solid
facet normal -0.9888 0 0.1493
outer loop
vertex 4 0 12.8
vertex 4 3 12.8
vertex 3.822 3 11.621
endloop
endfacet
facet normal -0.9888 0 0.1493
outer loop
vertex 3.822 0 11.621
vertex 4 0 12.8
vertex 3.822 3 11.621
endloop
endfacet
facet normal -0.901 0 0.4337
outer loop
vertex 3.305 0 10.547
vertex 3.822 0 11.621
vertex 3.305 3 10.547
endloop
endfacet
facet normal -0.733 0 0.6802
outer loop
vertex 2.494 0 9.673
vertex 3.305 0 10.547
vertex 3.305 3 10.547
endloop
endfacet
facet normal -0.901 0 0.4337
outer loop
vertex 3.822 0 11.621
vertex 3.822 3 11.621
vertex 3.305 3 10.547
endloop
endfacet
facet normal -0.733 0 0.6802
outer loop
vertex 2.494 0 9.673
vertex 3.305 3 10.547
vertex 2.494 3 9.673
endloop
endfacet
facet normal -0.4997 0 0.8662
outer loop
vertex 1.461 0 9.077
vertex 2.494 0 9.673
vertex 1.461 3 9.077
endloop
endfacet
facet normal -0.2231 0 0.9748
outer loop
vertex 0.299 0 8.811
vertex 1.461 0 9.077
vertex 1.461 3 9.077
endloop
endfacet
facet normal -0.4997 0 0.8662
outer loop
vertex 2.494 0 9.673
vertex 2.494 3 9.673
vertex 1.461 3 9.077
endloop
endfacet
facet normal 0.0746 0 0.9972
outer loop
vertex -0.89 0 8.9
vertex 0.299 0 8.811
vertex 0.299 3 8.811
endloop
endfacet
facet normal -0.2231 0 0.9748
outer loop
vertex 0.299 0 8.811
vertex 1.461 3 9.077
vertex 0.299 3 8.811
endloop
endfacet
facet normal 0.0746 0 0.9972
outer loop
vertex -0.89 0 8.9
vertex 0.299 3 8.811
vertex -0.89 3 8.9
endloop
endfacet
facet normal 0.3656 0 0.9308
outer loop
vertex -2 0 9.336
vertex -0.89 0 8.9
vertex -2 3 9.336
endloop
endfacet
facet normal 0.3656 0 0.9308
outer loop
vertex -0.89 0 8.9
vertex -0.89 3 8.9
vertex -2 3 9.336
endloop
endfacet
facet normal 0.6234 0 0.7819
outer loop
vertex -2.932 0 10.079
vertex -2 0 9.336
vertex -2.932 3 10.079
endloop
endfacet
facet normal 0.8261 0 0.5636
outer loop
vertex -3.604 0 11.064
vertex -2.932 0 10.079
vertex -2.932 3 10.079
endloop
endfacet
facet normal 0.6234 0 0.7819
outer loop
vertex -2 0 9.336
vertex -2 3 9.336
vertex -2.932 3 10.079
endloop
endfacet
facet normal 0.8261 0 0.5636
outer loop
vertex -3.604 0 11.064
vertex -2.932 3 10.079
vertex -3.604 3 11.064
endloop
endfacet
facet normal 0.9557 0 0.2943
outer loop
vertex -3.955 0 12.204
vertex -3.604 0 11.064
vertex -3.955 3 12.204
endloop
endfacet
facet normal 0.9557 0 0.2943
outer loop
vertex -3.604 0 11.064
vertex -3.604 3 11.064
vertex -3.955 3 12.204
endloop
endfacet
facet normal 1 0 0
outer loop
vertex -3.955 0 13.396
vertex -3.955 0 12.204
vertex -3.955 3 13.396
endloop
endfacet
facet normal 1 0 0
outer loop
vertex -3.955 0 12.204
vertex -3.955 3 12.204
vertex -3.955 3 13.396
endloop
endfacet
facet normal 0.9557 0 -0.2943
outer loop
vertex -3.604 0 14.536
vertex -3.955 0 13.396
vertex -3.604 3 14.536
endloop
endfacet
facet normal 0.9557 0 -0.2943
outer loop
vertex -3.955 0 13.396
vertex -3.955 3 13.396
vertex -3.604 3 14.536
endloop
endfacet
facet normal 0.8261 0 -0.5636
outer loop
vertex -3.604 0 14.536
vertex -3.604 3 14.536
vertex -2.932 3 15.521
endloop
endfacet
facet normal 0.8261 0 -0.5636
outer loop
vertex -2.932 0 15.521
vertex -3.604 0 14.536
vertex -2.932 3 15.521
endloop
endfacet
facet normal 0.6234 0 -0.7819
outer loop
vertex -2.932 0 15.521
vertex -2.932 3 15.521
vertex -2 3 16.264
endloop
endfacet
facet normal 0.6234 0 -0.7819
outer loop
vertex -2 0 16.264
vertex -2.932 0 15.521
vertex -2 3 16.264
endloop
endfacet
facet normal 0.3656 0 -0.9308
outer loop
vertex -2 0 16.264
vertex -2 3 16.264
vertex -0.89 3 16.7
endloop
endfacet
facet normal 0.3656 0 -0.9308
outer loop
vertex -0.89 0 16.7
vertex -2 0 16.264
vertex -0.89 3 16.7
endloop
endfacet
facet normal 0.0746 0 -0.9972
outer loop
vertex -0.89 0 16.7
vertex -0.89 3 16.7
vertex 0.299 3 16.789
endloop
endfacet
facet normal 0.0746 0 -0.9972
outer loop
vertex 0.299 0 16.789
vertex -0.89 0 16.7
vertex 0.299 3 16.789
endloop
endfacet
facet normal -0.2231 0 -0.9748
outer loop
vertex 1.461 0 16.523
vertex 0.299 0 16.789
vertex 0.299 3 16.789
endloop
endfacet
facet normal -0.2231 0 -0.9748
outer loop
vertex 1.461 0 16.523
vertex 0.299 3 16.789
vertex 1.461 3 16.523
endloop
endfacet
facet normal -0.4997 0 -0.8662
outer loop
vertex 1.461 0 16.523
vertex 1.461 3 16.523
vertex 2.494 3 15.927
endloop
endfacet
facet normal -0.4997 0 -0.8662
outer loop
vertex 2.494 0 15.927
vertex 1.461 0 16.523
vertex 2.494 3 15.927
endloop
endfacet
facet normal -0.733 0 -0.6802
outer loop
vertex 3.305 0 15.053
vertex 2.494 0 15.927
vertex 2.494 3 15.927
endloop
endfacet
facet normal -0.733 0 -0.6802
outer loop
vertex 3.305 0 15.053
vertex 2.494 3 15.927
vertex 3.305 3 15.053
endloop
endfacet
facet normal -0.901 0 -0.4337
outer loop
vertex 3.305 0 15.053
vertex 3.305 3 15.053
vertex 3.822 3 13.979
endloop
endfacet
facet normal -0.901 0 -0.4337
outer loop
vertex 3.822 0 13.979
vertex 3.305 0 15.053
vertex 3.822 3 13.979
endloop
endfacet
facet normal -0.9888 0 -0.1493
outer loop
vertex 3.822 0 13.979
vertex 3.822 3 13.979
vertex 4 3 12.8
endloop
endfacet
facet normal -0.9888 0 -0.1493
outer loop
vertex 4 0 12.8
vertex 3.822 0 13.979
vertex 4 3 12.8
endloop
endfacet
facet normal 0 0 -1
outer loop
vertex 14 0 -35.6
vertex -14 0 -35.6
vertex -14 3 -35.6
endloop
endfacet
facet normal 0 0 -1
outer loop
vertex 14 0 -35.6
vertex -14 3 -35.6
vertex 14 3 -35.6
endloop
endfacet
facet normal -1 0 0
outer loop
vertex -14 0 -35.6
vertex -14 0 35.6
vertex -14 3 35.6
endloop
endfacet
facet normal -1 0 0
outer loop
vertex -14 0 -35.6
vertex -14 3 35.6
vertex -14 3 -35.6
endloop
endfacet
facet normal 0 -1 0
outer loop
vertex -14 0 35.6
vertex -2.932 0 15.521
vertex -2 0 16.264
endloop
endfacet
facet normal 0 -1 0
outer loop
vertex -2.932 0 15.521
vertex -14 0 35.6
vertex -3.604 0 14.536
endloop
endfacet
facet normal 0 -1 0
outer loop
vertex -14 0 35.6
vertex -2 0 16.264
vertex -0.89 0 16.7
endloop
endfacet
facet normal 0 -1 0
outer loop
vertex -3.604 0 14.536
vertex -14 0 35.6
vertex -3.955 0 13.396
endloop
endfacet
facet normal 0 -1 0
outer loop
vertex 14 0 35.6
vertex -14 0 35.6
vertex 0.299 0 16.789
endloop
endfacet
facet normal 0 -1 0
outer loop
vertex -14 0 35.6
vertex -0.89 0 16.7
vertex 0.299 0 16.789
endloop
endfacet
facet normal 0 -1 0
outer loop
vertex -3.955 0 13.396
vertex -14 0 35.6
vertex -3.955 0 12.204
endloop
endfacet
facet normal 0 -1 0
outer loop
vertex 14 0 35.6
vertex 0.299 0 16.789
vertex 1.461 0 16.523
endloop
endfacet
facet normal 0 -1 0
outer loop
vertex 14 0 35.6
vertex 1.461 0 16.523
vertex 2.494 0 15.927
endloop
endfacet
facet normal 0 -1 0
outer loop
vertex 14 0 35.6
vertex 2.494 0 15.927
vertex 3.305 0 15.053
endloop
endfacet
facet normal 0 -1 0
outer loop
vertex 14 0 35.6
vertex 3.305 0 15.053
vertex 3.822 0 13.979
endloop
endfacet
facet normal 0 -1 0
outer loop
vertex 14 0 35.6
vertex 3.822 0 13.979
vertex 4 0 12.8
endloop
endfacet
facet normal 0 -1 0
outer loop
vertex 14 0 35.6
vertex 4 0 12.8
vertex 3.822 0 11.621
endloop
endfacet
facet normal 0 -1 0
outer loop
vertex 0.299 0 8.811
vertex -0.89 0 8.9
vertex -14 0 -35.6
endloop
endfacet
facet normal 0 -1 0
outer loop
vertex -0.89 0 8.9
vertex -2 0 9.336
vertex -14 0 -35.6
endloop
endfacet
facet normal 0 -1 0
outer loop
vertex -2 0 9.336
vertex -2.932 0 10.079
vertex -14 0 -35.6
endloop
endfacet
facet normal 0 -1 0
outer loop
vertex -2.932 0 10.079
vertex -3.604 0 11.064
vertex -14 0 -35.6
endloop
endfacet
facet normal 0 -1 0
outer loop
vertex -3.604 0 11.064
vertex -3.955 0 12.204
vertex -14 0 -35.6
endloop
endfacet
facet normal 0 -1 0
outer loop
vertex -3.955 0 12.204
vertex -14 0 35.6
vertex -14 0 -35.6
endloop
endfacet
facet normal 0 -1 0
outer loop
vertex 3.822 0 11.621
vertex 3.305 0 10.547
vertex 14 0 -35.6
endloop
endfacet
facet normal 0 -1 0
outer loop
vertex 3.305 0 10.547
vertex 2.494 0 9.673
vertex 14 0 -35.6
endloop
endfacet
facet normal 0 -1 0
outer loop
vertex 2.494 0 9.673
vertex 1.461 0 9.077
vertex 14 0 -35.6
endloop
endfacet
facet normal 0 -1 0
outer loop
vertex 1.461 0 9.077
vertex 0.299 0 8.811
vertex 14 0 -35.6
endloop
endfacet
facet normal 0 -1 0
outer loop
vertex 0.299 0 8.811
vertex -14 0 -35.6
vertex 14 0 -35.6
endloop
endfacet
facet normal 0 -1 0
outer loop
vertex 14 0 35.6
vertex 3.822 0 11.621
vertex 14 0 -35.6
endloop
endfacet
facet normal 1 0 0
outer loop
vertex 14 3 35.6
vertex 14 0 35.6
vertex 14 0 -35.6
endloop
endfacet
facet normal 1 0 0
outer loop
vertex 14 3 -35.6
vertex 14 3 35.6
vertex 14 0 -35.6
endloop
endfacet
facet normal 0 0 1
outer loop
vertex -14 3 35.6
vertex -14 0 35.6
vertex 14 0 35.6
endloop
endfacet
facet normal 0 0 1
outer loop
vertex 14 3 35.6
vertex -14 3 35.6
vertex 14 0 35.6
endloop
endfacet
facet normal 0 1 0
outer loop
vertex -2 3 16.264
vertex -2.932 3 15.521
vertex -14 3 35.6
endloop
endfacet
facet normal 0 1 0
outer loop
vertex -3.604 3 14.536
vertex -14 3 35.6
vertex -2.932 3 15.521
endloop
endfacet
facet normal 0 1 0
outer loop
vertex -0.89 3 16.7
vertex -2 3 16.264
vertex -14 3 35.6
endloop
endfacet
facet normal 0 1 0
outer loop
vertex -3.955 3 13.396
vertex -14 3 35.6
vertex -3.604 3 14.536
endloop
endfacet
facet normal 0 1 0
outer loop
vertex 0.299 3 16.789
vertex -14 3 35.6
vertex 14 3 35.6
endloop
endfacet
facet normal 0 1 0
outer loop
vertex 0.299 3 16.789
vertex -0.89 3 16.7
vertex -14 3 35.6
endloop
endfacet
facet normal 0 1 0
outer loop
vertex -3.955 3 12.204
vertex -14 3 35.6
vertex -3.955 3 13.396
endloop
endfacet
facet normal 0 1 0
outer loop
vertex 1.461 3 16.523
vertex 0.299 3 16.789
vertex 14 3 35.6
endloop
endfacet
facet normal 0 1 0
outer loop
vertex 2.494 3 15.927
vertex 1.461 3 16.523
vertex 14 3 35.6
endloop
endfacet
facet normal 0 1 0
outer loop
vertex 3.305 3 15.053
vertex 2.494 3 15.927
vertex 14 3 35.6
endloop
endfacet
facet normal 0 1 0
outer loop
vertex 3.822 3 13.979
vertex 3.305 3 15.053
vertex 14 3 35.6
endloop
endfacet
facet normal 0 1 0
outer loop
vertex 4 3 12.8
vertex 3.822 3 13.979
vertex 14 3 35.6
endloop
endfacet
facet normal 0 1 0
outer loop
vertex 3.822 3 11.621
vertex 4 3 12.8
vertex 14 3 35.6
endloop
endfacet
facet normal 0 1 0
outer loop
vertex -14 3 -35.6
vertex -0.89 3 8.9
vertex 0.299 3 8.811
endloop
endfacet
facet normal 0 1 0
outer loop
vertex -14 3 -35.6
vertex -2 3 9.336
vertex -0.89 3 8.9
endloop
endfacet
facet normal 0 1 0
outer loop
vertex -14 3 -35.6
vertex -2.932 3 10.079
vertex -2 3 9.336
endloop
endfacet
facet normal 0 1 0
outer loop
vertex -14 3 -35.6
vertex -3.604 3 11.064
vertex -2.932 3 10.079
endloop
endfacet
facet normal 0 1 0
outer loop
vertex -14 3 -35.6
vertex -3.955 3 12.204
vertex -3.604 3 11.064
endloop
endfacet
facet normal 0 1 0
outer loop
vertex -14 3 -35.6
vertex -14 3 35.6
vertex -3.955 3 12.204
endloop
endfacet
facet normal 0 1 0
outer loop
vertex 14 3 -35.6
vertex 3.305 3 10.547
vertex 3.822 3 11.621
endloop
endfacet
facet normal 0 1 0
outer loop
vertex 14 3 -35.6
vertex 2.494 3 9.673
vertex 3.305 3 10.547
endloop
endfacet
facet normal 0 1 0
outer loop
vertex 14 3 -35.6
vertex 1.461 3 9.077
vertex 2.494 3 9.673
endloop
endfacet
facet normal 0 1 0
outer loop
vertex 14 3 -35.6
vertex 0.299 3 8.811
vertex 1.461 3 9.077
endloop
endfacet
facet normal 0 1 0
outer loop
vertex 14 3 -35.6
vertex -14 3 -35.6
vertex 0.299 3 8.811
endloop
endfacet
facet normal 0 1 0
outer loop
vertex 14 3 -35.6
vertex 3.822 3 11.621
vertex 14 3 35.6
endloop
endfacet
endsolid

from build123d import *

# Parameters (mm, degrees)
SKETCH1_W           = 28
SKETCH1_H           = 71.2
BOSS_EXTRUDE1_DEPTH = 3
SKETCH4_R           = 1
CUT_EXTRUDE2_DEPTH  = 10
SKETCH5_R           = 4
CUT_EXTRUDE3_DEPTH  = 10
SKETCH10_R          = 1.75
CUT_EXTRUDE9_DEPTH  = 1.6
SKETCH12_R          = 1.75
BOSS_EXTRUDE2_DEPTH = 3


with BuildPart() as part:
    # Sketch1 → Boss-Extrude1 (new body)
    with BuildSketch(Plane(origin=(0, 0, 0), x_dir=(1, 0, 0), z_dir=(0, 1, 0))):
        Rectangle(SKETCH1_W, SKETCH1_H)
    extrude(amount=BOSS_EXTRUDE1_DEPTH)

    # Sketch4 → Cut-Extrude2 (cut)
    with BuildSketch(Plane(origin=(0, 3, 0), x_dir=(1, 0, 0), z_dir=(0, 1, 0))):
        with Locations((7, -12.8)):
            Circle(SKETCH4_R)
        with Locations((0, -19.8)):
            Circle(SKETCH4_R)
        with Locations((-7, -12.8)):
            Circle(SKETCH4_R)
        with Locations((0, -5.8)):
            Circle(SKETCH4_R)
    extrude(amount=-CUT_EXTRUDE2_DEPTH, mode=Mode.SUBTRACT)

    # Sketch5 → Cut-Extrude3 (cut)
    with BuildSketch(Plane(origin=(0, 3, 0), x_dir=(1, 0, 0), z_dir=(0, 1, 0))):
        with Locations((0, -12.8)):
            Circle(SKETCH5_R)
    extrude(amount=-CUT_EXTRUDE3_DEPTH, mode=Mode.SUBTRACT)

    # Sketch10 → Cut-Extrude9 (cut)
    with BuildSketch(Plane(origin=(0, 3, 0), x_dir=(1, 0, 0), z_dir=(0, 1, 0))):
        with Locations((0, -19.8)):
            Circle(SKETCH10_R)
        with Locations((-7, -12.8)):
            Circle(SKETCH10_R)
        with Locations((0, -5.8)):
            Circle(SKETCH10_R)
        with Locations((7, -12.8)):
            Circle(SKETCH10_R)
    extrude(amount=-CUT_EXTRUDE9_DEPTH, mode=Mode.SUBTRACT)

    # Sketch12 → Boss-Extrude2 (add)
    with BuildSketch(Plane(origin=(0, 3, 0), x_dir=(1, 0, 0), z_dir=(0, 1, 0))):
        with Locations((0, -19.8)):
            Circle(SKETCH12_R)
        with Locations((-7, -12.8)):
            Circle(SKETCH12_R)
        with Locations((0, -5.8)):
            Circle(SKETCH12_R)
        with Locations((7, -12.8)):
            Circle(SKETCH12_R)
    extrude(amount=-BOSS_EXTRUDE2_DEPTH)


solid = part.part
